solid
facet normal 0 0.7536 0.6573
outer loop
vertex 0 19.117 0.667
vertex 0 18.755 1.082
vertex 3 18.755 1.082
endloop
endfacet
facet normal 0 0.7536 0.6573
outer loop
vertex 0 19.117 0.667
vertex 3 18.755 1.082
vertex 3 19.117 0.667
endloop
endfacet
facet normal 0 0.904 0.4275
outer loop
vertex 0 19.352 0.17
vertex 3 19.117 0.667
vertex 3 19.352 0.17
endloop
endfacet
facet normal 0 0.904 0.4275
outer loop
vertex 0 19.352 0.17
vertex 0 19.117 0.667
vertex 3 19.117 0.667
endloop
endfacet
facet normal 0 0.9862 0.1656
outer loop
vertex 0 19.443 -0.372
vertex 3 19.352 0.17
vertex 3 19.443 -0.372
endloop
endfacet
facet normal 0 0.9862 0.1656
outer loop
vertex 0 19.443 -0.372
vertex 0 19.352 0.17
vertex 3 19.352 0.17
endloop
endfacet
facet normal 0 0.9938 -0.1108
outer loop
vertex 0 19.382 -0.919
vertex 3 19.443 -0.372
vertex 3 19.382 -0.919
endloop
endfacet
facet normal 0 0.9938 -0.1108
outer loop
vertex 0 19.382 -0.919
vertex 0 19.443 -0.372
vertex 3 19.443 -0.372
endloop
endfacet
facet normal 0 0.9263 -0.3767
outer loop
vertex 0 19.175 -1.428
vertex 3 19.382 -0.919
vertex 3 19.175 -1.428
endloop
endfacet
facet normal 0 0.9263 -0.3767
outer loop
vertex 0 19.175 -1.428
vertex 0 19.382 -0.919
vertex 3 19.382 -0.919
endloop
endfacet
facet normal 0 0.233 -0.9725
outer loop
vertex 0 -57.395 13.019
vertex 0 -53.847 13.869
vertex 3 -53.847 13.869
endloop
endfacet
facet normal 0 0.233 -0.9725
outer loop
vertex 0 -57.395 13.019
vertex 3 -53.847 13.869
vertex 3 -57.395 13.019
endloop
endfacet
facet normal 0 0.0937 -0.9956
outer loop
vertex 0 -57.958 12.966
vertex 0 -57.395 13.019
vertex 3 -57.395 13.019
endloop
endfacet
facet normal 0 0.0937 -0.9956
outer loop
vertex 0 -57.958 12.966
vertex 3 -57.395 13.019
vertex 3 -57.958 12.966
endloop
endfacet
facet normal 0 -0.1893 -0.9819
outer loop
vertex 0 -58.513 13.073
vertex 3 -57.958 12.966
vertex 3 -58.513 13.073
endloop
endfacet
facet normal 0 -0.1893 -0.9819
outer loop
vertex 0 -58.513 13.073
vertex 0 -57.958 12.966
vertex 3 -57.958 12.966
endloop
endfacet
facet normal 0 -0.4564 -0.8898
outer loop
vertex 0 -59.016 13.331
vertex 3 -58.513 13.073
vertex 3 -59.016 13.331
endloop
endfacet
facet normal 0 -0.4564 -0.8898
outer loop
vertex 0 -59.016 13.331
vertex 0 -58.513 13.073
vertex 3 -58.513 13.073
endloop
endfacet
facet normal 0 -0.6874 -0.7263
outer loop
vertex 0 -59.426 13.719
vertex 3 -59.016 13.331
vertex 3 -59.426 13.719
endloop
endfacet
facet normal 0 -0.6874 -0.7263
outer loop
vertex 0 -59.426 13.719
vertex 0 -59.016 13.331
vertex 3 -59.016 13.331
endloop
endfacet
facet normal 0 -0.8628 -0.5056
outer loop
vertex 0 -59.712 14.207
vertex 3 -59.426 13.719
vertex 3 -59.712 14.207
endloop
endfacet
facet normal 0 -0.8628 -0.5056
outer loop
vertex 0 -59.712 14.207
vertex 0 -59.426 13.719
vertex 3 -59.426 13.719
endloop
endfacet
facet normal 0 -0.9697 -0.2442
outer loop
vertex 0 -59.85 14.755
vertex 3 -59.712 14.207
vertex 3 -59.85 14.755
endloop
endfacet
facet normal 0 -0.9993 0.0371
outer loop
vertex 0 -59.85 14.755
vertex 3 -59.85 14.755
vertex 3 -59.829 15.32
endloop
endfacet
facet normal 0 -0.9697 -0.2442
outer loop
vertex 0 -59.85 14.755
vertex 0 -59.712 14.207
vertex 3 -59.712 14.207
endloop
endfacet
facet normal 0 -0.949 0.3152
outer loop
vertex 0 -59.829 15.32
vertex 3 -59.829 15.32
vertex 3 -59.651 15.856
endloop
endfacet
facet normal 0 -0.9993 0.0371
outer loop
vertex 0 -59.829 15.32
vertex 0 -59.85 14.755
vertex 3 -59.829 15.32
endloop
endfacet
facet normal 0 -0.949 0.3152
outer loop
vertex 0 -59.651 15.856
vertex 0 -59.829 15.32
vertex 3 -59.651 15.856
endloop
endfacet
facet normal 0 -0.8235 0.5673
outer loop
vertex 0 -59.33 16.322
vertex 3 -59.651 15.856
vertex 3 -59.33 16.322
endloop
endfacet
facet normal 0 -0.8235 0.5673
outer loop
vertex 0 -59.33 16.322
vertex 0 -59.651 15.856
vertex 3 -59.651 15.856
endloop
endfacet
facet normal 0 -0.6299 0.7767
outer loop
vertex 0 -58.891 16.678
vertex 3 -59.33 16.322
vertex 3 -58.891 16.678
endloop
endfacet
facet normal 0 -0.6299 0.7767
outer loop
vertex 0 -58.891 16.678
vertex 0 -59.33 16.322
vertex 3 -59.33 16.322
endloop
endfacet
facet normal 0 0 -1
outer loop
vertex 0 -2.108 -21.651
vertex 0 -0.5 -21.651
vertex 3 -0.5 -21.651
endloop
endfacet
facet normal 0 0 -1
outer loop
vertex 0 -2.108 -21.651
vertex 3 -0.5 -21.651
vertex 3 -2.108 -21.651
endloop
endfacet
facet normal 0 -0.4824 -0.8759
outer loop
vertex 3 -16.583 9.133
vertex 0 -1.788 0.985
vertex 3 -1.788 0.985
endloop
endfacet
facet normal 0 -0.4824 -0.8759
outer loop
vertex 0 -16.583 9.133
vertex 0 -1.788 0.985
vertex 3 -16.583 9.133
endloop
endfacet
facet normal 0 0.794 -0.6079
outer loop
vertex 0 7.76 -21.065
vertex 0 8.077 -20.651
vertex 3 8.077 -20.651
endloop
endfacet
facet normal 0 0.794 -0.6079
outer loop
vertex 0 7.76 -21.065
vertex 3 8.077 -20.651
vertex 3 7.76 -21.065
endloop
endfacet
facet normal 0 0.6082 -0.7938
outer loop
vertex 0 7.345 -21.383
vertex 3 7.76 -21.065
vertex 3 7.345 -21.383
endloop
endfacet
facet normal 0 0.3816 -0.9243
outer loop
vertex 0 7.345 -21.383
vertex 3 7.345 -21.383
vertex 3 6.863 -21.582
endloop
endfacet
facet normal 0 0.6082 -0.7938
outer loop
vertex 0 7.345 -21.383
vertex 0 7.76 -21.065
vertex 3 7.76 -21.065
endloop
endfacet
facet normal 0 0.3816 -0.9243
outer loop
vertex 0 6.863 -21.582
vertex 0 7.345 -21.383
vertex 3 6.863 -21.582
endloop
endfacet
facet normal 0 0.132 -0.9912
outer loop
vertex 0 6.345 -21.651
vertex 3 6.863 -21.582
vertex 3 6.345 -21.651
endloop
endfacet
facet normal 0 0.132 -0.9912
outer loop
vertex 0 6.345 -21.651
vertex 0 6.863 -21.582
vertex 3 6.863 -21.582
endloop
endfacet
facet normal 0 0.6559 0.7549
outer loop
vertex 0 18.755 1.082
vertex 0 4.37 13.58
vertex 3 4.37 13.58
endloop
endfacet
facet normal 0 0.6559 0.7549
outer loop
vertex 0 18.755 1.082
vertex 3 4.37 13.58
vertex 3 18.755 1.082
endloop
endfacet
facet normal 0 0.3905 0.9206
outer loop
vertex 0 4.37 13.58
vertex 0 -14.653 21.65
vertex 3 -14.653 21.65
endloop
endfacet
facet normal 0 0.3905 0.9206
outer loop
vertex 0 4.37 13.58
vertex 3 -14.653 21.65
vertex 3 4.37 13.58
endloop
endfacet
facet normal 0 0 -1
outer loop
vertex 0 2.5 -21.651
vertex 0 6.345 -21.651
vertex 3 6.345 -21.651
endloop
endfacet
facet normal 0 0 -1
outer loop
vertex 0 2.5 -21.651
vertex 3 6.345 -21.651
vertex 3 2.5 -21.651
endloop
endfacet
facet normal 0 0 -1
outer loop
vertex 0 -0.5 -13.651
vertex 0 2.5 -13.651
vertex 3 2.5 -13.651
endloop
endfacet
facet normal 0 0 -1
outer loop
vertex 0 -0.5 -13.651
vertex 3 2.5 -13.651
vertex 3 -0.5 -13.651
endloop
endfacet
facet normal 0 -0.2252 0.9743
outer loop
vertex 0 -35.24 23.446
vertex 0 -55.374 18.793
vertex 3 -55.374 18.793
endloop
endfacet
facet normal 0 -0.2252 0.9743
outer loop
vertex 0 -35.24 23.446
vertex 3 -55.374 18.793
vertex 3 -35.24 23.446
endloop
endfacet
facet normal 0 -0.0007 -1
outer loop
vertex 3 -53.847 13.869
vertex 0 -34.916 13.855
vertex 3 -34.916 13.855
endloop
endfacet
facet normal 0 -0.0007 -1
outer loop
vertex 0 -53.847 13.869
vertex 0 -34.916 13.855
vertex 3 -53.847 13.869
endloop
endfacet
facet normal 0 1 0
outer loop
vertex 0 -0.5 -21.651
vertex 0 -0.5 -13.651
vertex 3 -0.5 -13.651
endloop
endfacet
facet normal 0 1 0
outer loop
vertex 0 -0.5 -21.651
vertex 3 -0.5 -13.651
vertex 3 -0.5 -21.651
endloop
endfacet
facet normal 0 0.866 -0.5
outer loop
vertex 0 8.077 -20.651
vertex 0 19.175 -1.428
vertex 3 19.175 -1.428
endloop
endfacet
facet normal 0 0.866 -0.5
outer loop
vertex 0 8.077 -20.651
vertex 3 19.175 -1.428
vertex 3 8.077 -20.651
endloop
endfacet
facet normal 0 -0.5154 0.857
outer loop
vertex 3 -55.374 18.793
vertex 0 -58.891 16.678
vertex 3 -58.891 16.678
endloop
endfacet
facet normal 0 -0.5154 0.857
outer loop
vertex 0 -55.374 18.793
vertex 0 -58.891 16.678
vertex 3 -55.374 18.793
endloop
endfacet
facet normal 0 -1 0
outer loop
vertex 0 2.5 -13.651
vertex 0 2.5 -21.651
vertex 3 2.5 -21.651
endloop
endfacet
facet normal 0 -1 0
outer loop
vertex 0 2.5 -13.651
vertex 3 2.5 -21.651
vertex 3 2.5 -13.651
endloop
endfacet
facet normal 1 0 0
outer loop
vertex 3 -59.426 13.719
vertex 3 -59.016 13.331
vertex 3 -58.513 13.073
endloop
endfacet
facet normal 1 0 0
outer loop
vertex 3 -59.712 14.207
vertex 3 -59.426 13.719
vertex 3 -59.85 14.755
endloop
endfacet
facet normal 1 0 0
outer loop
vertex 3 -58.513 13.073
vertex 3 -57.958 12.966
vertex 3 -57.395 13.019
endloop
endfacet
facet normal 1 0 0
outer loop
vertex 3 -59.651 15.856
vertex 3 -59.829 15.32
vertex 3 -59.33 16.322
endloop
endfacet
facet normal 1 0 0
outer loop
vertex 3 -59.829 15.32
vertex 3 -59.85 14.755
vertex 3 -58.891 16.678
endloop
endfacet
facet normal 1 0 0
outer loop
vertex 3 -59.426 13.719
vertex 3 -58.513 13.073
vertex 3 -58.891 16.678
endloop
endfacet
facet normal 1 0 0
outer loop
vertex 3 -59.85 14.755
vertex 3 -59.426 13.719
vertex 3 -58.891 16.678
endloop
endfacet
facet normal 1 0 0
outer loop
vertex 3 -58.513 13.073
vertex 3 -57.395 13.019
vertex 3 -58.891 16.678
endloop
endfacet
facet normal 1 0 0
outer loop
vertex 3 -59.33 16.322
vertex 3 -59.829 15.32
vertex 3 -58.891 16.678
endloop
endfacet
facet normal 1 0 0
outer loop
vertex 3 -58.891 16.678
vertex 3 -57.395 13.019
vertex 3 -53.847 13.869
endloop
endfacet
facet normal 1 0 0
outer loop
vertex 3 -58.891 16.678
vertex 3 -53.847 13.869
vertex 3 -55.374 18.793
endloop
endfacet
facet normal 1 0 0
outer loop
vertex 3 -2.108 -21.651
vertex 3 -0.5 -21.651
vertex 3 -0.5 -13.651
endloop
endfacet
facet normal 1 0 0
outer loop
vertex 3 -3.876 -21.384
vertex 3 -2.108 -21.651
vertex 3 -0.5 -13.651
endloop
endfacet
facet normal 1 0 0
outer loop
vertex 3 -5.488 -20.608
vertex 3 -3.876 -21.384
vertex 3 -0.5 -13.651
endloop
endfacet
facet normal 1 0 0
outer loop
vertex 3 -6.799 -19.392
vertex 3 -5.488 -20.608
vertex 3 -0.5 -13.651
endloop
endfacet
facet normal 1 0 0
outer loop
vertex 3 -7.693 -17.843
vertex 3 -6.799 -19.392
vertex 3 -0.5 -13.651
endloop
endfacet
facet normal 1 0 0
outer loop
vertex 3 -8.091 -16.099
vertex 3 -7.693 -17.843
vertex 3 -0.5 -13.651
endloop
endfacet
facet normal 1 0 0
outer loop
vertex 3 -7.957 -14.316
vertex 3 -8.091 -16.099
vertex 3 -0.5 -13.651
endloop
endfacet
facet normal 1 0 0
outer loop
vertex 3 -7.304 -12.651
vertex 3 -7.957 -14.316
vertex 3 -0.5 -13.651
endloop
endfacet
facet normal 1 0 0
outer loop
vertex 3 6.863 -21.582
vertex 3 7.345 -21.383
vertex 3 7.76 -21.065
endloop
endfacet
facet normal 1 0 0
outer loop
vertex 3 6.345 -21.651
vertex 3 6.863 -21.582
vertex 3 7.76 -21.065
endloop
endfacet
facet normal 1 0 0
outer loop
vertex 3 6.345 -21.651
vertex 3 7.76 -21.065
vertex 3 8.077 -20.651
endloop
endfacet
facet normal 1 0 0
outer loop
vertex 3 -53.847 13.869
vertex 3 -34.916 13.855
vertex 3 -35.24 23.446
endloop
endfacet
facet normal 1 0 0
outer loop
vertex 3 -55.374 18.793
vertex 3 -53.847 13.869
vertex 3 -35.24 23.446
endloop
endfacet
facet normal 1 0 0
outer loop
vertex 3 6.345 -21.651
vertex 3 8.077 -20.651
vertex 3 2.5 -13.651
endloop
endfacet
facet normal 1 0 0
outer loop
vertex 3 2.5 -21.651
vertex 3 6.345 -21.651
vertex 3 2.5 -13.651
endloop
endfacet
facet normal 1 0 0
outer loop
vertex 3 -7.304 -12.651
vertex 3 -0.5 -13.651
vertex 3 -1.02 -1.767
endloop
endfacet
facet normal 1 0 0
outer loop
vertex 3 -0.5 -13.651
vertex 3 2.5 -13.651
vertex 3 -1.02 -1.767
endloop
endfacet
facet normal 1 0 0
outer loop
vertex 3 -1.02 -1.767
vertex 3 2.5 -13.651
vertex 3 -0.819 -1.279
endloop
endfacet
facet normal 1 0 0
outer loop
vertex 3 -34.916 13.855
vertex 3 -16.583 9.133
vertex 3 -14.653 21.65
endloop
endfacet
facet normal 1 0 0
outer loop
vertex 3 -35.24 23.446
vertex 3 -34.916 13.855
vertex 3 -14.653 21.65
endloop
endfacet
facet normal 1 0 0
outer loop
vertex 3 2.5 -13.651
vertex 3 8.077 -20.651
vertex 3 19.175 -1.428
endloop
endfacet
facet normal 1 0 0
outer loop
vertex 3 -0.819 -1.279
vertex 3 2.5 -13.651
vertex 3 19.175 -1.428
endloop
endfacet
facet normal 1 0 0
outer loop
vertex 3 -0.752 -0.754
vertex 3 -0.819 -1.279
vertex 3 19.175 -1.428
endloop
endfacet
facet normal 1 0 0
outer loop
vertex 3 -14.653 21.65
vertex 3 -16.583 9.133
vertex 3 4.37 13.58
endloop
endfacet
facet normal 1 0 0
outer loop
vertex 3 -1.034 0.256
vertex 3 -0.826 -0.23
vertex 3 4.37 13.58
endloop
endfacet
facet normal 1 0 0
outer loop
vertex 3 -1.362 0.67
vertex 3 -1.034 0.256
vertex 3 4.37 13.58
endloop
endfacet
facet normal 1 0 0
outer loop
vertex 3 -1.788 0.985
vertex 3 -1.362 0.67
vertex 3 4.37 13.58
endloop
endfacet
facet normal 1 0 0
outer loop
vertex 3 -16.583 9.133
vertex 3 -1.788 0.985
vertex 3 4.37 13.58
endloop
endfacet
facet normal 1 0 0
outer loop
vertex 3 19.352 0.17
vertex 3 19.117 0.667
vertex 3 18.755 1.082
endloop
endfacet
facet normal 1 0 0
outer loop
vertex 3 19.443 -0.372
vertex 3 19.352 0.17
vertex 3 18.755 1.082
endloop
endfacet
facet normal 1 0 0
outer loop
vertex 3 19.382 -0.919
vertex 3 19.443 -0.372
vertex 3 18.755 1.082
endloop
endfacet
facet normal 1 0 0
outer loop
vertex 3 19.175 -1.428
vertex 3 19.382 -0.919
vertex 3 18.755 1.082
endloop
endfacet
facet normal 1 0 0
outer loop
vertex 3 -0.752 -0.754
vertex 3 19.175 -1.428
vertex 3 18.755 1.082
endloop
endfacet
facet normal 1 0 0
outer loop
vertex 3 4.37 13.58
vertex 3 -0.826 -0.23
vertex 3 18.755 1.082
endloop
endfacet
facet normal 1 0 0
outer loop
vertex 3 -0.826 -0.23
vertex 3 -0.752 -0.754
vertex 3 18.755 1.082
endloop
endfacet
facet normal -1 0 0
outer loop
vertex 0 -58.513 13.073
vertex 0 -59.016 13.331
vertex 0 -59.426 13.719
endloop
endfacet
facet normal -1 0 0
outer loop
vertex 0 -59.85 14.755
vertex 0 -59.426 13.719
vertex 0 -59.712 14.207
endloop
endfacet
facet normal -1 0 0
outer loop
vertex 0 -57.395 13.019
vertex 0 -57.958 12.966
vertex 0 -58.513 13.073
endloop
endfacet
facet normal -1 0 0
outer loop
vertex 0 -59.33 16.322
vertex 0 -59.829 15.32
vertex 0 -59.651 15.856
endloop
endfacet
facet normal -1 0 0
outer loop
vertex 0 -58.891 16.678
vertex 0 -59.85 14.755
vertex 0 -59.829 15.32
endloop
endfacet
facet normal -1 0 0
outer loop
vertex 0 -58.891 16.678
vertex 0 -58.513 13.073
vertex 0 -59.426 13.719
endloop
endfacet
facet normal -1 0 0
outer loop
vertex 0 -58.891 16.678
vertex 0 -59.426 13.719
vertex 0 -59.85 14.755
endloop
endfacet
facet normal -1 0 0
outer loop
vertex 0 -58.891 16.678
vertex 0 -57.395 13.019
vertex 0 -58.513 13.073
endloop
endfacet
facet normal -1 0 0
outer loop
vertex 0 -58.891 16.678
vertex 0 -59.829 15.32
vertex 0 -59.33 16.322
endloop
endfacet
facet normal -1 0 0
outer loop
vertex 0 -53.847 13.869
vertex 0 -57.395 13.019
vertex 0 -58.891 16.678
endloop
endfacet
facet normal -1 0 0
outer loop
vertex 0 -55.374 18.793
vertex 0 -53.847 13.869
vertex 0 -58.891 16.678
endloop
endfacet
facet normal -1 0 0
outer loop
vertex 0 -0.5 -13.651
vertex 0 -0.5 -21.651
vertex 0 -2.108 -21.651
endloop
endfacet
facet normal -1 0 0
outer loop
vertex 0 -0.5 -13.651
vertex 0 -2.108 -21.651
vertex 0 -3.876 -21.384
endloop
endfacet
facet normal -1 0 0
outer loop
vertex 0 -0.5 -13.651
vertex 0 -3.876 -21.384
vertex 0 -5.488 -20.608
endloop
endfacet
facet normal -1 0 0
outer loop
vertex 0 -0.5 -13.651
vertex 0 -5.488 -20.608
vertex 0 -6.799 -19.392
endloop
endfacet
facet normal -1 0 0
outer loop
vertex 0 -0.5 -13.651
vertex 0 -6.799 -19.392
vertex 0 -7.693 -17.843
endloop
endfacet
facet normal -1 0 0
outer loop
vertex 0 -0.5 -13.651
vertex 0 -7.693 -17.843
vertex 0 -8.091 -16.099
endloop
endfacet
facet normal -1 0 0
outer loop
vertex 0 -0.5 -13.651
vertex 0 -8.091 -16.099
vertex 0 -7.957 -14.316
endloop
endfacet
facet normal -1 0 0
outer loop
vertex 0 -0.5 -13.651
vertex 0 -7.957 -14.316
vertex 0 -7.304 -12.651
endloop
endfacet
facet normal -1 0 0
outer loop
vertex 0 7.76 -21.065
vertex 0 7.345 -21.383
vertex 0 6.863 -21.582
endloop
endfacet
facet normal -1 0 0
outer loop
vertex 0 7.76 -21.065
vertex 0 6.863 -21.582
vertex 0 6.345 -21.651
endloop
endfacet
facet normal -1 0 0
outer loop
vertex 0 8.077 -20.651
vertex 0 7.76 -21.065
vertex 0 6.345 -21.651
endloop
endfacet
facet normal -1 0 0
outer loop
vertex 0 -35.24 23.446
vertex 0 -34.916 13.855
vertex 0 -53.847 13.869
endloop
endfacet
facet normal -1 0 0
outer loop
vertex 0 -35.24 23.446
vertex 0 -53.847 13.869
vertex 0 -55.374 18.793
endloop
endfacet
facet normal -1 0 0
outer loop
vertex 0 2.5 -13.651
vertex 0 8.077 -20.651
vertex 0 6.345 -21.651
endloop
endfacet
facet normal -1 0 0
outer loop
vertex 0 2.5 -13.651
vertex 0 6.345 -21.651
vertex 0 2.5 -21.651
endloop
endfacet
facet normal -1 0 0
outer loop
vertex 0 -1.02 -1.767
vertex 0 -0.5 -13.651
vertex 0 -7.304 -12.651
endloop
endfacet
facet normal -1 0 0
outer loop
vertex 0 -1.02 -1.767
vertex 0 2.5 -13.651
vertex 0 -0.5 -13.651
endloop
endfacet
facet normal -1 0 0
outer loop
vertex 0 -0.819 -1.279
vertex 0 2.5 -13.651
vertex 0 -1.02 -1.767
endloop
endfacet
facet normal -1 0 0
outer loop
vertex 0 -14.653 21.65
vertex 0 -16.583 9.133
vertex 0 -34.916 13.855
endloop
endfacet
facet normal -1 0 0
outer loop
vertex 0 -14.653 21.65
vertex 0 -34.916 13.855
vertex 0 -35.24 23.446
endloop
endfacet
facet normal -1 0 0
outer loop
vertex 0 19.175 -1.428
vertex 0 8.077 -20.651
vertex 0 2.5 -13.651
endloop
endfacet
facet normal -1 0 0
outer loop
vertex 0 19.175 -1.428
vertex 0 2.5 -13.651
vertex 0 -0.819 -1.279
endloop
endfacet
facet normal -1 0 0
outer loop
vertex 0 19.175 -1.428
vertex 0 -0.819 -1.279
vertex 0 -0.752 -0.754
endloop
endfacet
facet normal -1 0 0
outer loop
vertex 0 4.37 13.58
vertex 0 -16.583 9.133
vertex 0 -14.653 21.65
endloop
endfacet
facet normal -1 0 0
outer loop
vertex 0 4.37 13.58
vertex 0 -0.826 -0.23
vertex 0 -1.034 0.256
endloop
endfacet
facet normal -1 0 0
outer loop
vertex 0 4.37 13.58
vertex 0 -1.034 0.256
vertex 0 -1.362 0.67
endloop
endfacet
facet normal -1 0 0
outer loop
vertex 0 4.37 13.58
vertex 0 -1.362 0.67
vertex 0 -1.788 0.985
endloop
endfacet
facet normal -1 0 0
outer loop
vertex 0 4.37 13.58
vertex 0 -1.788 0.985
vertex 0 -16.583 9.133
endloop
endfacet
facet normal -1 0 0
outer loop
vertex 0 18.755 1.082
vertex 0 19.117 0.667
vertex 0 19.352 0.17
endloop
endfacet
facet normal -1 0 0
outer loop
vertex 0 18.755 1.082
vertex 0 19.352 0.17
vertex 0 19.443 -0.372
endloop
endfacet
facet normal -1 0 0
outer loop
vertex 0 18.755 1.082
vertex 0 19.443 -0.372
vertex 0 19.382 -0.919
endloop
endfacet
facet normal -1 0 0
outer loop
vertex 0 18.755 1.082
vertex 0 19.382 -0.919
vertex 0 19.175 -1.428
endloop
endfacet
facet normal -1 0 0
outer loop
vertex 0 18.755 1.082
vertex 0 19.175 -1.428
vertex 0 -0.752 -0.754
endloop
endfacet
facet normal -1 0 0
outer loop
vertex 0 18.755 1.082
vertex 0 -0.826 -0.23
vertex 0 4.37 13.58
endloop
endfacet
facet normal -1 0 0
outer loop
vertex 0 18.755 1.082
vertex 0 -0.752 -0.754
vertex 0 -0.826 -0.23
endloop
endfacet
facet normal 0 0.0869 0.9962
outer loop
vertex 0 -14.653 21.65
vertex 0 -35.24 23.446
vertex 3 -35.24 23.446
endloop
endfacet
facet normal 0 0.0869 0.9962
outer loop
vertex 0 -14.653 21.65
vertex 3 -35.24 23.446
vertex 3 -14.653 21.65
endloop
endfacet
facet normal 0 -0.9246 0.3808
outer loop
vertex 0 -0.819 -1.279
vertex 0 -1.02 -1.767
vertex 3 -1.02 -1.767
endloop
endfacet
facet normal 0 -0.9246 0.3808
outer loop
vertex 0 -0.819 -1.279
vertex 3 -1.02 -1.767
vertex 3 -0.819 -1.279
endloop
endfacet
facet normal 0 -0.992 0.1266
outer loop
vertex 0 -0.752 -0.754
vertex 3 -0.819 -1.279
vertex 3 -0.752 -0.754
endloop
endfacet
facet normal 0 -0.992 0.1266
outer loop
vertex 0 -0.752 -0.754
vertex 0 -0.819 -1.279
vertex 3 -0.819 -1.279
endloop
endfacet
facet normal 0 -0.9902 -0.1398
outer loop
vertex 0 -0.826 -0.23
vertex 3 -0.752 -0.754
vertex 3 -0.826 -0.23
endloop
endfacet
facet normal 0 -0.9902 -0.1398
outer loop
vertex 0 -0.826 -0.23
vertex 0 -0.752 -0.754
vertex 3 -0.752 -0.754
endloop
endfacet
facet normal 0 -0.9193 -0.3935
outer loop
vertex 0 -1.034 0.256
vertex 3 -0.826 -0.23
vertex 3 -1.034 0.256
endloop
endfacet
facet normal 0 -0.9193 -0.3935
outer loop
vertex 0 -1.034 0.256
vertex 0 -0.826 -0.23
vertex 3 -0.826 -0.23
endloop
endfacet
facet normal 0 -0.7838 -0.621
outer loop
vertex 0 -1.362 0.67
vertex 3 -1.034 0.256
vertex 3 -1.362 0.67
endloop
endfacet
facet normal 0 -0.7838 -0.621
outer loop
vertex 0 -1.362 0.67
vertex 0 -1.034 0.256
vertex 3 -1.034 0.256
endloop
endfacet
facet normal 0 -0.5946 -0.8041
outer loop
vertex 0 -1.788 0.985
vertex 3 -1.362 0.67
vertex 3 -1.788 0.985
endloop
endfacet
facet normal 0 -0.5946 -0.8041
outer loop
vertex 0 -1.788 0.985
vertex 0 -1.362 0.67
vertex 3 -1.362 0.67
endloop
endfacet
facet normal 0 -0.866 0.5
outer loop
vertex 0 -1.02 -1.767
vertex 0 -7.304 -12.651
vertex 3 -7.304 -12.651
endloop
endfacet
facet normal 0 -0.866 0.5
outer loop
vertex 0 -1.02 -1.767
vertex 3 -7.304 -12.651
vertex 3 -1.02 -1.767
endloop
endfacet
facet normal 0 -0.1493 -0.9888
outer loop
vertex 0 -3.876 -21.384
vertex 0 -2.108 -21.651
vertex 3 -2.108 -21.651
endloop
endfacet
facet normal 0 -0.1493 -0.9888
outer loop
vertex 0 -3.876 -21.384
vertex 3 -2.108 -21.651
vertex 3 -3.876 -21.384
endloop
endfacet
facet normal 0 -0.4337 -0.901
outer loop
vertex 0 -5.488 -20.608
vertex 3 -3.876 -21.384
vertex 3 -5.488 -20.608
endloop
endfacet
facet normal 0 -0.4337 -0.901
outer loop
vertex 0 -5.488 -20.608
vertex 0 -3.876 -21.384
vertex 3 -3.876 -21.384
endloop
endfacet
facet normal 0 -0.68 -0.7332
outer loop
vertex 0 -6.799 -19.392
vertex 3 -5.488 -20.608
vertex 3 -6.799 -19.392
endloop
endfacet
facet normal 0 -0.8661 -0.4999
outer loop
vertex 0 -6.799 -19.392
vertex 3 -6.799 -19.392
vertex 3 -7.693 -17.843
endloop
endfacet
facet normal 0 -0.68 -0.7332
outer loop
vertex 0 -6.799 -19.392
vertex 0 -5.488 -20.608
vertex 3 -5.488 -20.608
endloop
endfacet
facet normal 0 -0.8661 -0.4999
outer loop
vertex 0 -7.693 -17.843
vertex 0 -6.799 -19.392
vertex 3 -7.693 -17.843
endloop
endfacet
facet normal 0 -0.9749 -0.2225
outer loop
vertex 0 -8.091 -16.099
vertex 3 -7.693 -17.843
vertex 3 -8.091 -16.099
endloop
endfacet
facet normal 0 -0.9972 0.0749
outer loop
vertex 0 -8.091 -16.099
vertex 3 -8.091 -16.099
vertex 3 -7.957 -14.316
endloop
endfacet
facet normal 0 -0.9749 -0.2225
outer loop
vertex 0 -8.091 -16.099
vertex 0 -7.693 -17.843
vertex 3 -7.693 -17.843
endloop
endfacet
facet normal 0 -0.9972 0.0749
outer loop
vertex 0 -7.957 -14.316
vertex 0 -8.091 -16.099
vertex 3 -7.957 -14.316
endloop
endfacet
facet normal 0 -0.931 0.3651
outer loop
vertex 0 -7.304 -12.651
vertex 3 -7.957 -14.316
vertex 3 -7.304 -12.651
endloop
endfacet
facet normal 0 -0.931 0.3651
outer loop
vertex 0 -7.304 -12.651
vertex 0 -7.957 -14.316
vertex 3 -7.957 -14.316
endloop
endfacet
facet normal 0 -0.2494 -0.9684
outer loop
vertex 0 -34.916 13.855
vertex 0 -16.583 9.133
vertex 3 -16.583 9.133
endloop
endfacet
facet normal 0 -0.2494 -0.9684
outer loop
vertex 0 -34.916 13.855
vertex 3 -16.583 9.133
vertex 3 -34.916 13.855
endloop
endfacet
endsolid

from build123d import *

# Parameters (mm, degrees)
BOSS_EXTRUDE1_DEPTH = 3


with BuildPart() as part:
    # Sketch1 → Boss-Extrude1 (new body)
    with BuildSketch(Plane(origin=(0, 0, 0), x_dir=(0, 0, -1), z_dir=(1, 0, 0))):
        with BuildLine():
            Line((-13.869045208, -53.846884879), (-13.019160894, -57.395119241))
            ThreePointArc((-13.019160894, -57.395119241), (-14.207117004, -59.712178989), (-16.67823792, -58.891467706))
            Line((-16.67823792, -58.891467706), (-18.79288086, -55.373986049))
            Line((-18.79288086, -55.373986049), (-23.446176246, -35.239966644))
            Line((-23.446176246, -35.239966644), (-21.649968985, -14.653428937))
            Line((-21.649968985, -14.653428937), (-13.580084357, 4.370473329))
            Line((-13.580084357, 4.370473329), (-1.081593074, 18.755177998))
            ThreePointArc((-1.081593074, 18.755177998), (0.097807511, 19.415947524), (1.428134813, 19.175465981))
            Line((1.428134813, 19.175465981), (20.650635095, 8.077350269))
            ThreePointArc((20.650635095, 8.077350269), (21.382685902, 7.345299462), (21.650635095, 6.345299462))
            Line((21.650635095, 6.345299462), (21.650635095, 2.5))
            Line((21.650635095, 2.5), (13.650635095, 2.5))
            Line((13.650635095, 2.5), (13.650635095, -0.5))
            Line((13.650635095, -0.5), (21.650635095, -0.5))
            Line((21.650635095, -0.5), (21.650635095, -2.107695155))
            ThreePointArc((21.650635095, -2.107695155), (18.650635095, -7.303847577), (12.650635095, -7.303847577))
            Line((12.650635095, -7.303847577), (1.767371596, -1.020392466))
            ThreePointArc((1.767371596, -1.020392466), (0.230262068, -0.825914438), (-0.984510925, -1.787607726))
            Line((-0.984510925, -1.787607726), (-9.132781883, -16.582681858))
            Line((-9.132781883, -16.582681858), (-13.854695348, -34.915618767))
            Line((-13.854695348, -34.915618767), (-13.869045208, -53.846884879))
        make_face()
    extrude(amount=BOSS_EXTRUDE1_DEPTH)


solid = part.part
